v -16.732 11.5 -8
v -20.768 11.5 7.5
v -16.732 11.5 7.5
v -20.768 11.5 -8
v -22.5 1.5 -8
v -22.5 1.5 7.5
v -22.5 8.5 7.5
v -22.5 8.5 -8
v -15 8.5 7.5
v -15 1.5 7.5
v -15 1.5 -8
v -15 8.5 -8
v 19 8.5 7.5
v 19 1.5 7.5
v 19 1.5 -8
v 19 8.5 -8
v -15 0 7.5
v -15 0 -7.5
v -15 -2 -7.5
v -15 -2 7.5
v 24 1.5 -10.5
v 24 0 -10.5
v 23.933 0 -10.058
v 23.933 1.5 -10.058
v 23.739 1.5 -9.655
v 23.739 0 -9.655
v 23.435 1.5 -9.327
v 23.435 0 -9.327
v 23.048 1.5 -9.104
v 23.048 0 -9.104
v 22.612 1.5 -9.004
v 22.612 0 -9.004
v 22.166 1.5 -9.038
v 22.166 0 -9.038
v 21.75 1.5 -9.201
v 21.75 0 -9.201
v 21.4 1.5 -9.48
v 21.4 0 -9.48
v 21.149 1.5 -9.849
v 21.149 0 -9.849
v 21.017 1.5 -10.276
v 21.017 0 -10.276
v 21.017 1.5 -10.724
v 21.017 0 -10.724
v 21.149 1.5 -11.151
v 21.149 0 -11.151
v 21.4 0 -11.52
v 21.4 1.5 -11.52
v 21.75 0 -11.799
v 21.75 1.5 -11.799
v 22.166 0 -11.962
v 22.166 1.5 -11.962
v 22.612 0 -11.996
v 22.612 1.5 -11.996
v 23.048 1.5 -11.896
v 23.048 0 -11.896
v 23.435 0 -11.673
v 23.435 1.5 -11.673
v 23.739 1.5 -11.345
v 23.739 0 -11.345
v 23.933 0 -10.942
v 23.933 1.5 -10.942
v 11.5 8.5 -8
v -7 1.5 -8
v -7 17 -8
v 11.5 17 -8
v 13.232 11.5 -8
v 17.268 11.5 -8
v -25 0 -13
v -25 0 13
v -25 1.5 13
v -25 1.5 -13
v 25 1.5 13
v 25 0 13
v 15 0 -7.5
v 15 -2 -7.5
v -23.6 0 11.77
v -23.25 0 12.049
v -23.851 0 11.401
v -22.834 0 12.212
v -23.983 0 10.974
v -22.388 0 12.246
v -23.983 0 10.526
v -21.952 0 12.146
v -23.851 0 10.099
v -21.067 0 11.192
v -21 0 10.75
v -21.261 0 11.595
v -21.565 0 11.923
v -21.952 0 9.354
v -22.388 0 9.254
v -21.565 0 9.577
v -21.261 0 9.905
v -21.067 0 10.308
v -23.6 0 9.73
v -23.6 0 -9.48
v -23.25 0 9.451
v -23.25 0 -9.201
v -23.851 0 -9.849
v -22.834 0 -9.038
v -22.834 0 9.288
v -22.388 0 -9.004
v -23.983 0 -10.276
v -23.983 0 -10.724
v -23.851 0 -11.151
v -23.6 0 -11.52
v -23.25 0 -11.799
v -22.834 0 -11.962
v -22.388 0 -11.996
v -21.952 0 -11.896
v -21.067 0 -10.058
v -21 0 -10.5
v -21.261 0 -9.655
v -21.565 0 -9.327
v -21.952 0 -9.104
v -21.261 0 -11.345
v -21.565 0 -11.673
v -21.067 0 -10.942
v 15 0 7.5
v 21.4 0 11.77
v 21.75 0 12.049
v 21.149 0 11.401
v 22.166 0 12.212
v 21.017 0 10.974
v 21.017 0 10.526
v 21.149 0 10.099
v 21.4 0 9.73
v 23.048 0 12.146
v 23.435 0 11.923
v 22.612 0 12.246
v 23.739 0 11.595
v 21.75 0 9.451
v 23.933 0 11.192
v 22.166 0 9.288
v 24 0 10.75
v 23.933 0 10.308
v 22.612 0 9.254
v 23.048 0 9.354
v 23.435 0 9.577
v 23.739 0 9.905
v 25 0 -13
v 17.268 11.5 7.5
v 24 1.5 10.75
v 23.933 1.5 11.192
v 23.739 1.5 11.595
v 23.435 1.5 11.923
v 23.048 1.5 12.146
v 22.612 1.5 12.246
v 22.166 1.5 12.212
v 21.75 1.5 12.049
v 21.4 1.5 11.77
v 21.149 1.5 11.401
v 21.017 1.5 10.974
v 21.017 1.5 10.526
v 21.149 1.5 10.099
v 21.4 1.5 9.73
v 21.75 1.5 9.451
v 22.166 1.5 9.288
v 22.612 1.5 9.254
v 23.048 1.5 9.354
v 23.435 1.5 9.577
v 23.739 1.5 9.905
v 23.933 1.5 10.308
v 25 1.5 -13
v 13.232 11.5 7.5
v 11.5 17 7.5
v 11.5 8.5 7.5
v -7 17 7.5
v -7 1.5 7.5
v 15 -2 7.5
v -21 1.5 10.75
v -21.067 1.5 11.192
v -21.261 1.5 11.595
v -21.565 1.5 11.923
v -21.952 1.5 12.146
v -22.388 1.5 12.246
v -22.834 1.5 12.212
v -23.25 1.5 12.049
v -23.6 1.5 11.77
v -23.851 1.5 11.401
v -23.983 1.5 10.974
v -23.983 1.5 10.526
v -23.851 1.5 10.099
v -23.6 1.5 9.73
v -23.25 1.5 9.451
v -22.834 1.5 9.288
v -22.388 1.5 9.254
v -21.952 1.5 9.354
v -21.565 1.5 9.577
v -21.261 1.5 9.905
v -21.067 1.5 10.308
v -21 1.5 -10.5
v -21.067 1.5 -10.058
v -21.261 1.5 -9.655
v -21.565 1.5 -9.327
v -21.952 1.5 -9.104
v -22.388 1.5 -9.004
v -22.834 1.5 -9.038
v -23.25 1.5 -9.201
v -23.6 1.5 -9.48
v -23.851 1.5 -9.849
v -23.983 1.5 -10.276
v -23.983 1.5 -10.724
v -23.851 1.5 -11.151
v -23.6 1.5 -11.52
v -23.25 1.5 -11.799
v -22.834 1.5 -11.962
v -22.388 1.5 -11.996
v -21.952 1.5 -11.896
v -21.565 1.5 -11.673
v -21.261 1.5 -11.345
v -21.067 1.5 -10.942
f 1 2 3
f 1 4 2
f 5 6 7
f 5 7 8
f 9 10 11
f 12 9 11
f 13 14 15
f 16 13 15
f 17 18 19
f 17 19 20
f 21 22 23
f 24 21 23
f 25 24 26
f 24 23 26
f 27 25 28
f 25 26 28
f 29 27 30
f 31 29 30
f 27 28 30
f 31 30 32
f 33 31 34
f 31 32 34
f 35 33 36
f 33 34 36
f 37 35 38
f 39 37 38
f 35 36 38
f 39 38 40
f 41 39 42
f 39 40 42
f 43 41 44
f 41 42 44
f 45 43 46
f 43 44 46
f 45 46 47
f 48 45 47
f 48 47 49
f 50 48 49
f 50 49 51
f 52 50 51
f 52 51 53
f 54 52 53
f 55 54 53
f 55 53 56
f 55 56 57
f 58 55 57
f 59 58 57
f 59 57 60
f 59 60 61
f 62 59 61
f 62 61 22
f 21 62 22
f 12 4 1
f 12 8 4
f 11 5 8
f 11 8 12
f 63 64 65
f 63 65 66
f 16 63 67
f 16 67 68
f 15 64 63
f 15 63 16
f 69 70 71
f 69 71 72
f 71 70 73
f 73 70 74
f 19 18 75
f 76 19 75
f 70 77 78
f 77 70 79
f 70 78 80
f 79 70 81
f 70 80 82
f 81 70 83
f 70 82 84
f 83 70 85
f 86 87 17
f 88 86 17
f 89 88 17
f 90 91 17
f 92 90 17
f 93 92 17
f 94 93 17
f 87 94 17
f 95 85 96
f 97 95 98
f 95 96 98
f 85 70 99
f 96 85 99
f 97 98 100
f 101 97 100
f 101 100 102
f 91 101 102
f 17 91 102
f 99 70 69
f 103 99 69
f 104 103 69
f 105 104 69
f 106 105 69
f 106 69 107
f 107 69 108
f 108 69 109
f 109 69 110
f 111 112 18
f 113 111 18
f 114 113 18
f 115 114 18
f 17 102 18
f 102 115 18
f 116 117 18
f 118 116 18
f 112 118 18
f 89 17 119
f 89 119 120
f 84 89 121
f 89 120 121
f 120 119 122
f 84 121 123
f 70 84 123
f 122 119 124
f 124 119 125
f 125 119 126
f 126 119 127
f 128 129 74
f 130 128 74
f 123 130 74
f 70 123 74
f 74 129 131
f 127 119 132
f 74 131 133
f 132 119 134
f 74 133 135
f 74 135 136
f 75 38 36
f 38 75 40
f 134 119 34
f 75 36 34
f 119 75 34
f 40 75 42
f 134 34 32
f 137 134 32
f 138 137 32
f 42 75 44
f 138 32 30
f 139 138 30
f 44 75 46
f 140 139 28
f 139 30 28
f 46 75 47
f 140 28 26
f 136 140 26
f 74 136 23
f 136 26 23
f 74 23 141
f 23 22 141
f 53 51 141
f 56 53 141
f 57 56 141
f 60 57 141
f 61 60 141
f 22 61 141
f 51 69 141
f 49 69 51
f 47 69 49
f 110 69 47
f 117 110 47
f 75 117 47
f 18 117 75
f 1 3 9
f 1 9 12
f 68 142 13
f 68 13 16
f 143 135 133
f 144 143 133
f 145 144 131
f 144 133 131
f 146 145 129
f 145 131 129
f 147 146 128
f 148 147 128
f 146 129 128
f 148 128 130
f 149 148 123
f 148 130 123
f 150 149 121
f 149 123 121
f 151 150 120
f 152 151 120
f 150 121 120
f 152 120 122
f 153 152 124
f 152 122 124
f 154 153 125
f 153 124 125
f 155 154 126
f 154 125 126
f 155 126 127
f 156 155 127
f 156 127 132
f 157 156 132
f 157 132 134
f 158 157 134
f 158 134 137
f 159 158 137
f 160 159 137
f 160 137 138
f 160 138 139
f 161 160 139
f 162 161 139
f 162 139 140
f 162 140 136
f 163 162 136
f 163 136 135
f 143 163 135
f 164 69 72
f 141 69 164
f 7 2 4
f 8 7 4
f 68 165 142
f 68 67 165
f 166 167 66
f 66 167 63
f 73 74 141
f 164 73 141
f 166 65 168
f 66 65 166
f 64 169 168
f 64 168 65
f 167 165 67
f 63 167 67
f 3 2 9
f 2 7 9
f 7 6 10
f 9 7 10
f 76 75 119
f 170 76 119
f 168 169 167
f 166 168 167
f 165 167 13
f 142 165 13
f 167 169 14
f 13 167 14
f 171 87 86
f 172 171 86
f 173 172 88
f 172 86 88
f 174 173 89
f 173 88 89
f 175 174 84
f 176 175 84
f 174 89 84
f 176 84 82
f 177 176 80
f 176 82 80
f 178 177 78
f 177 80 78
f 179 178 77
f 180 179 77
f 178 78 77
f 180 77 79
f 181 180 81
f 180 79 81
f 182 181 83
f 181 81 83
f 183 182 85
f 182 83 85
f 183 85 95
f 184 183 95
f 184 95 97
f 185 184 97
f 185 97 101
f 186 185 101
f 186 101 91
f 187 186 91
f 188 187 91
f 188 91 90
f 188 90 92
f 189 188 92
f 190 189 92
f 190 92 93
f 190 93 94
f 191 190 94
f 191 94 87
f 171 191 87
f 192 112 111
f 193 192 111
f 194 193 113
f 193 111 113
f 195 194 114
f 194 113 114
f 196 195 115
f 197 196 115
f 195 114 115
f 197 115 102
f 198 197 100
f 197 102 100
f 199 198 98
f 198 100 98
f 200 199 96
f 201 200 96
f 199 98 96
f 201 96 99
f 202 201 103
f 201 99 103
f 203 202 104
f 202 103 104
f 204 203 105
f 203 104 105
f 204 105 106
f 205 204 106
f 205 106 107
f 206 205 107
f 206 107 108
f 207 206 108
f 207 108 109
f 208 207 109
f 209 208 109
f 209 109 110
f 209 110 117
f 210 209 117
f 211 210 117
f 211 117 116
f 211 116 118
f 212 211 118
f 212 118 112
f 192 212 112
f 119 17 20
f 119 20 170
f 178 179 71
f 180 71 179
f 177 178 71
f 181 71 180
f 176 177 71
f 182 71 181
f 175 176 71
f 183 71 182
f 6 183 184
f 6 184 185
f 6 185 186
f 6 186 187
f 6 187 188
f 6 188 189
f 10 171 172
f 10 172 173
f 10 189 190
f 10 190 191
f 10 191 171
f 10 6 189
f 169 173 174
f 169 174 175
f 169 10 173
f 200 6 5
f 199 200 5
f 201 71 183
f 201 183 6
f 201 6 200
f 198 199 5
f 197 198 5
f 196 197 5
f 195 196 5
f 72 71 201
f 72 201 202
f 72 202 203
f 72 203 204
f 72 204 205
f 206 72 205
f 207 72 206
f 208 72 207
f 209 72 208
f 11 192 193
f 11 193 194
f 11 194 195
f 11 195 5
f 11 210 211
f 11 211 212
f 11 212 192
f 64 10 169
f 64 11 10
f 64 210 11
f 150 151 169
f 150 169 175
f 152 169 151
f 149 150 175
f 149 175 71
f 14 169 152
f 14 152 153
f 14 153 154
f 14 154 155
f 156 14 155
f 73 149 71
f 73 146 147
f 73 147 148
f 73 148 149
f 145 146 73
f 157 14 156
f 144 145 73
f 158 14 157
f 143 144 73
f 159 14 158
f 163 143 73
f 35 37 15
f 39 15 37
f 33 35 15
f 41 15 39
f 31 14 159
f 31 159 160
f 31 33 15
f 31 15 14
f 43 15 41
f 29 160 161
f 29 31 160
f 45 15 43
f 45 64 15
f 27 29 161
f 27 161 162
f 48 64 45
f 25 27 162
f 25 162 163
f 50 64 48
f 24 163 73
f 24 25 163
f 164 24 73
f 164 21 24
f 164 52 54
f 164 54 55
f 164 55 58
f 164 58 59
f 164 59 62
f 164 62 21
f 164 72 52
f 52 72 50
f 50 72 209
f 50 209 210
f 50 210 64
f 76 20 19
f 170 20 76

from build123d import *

# Parameters (mm, degrees)
CROQUIS1_W              = 50
CROQUIS1_H              = 26
SALIENTE_EXTRUIR1_DEPTH = 1.5
CROQUIS2_W              = 7.5
CROQUIS2_H              = 15.5
SALIENTE_EXTRUIR2_DEPTH = 10
CHAFL_N1_SIZE           = 3
CHAFL_N1_SIZE2          = 1.732050808
CHAFL_N1_PART_2_SIZE    = 3
CHAFL_N1_PART_2_SIZE2   = 1.732050808
CHAFL_N1_PART_3_SIZE    = 3
CHAFL_N1_PART_3_SIZE2   = 1.732050808
CHAFL_N1_PART_4_SIZE    = 3
CHAFL_N1_PART_4_SIZE2   = 1.732050808
CROQUIS3_W              = 18.5
CROQUIS3_H              = 15.5
SALIENTE_EXTRUIR3_DEPTH = 15.5
CROQUIS4_W              = 30
CROQUIS4_H              = 15
SALIENTE_EXTRUIR4_DEPTH = 2
CROQUIS5_R              = 1.5
CORTAR_EXTRUIR1_DEPTH   = 2


with BuildPart() as part:
    # Croquis1 → Saliente-Extruir1 (new body)
    with BuildSketch(Plane(origin=(0, 0, 0), x_dir=(1, 0, 0), z_dir=(0, 1, 0))):
        Rectangle(CROQUIS1_W, CROQUIS1_H)
    extrude(amount=SALIENTE_EXTRUIR1_DEPTH)

    # Croquis2 → Saliente-Extruir2 (add)
    with BuildSketch(Plane(origin=(0, 1.5, 0), x_dir=(1, 0, 0), z_dir=(0, 1, 0))):
        with Locations((15.25, 0.25)):
            Rectangle(CROQUIS2_W, CROQUIS2_H)
        with Locations((-18.75, 0.25)):
            Rectangle(CROQUIS2_W, CROQUIS2_H)
    extrude(amount=SALIENTE_EXTRUIR2_DEPTH)

    # Chaflán1
    chafl_n1_edges = [part.edges().sort_by_distance(p)[0] for p in [
        (19, 11.5, -0.25),
    ]]
    chafl_n1_side = [part.faces().sort_by_distance(p)[0] for p in [
        (19, 6.5, -0.25),
    ]]
    chamfer(chafl_n1_edges, length=CHAFL_N1_SIZE, length2=CHAFL_N1_SIZE2, reference=chafl_n1_side[0])

    # Chaflán1 part 2
    chafl_n1_part_2_edges = [part.edges().sort_by_distance(p)[0] for p in [
        (11.5, 11.5, -0.25),
    ]]
    chafl_n1_part_2_side = [part.faces().sort_by_distance(p)[0] for p in [
        (11.5, 6.5, -0.25),
    ]]
    chamfer(chafl_n1_part_2_edges, length=CHAFL_N1_PART_2_SIZE, length2=CHAFL_N1_PART_2_SIZE2, reference=chafl_n1_part_2_side[0])

    # Chaflán1 part 3
    chafl_n1_part_3_edges = [part.edges().sort_by_distance(p)[0] for p in [
        (-15, 11.5, -0.25),
    ]]
    chafl_n1_part_3_side = [part.faces().sort_by_distance(p)[0] for p in [
        (-15, 6.5, -0.25),
    ]]
    chamfer(chafl_n1_part_3_edges, length=CHAFL_N1_PART_3_SIZE, length2=CHAFL_N1_PART_3_SIZE2, reference=chafl_n1_part_3_side[0])

    # Chaflán1 part 4
    chafl_n1_part_4_edges = [part.edges().sort_by_distance(p)[0] for p in [
        (-22.5, 11.5, -0.25),
    ]]
    chafl_n1_part_4_side = [part.faces().sort_by_distance(p)[0] for p in [
        (-22.5, 6.5, -0.25),
    ]]
    chamfer(chafl_n1_part_4_edges, length=CHAFL_N1_PART_4_SIZE, length2=CHAFL_N1_PART_4_SIZE2, reference=chafl_n1_part_4_side[0])

    # Croquis3 → Saliente-Extruir3 (add)
    with BuildSketch(Plane(origin=(0, 1.5, 0), x_dir=(1, 0, 0), z_dir=(0, 1, 0))):
        with Locations((2.25, 0.25)):
            Rectangle(CROQUIS3_W, CROQUIS3_H)
    extrude(amount=SALIENTE_EXTRUIR3_DEPTH)

    # Croquis4 → Saliente-Extruir4 (add)
    with BuildSketch(Plane.XZ):
        Rectangle(CROQUIS4_W, CROQUIS4_H)
    extrude(amount=SALIENTE_EXTRUIR4_DEPTH)

    # Croquis5 → Cortar-Extruir1 (cut)
    with BuildSketch(Plane.XZ):
        with Locations((-22.5, 10.75)):
            Circle(CROQUIS5_R)
        with Locations((22.5, 10.75)):
            Circle(CROQUIS5_R)
        with Locations((22.5, -10.5)):
            Circle(CROQUIS5_R)
        with Locations((-22.5, -10.5)):
            Circle(CROQUIS5_R)
    extrude(amount=-CORTAR_EXTRUIR1_DEPTH, mode=Mode.SUBTRACT)


solid = part.part
